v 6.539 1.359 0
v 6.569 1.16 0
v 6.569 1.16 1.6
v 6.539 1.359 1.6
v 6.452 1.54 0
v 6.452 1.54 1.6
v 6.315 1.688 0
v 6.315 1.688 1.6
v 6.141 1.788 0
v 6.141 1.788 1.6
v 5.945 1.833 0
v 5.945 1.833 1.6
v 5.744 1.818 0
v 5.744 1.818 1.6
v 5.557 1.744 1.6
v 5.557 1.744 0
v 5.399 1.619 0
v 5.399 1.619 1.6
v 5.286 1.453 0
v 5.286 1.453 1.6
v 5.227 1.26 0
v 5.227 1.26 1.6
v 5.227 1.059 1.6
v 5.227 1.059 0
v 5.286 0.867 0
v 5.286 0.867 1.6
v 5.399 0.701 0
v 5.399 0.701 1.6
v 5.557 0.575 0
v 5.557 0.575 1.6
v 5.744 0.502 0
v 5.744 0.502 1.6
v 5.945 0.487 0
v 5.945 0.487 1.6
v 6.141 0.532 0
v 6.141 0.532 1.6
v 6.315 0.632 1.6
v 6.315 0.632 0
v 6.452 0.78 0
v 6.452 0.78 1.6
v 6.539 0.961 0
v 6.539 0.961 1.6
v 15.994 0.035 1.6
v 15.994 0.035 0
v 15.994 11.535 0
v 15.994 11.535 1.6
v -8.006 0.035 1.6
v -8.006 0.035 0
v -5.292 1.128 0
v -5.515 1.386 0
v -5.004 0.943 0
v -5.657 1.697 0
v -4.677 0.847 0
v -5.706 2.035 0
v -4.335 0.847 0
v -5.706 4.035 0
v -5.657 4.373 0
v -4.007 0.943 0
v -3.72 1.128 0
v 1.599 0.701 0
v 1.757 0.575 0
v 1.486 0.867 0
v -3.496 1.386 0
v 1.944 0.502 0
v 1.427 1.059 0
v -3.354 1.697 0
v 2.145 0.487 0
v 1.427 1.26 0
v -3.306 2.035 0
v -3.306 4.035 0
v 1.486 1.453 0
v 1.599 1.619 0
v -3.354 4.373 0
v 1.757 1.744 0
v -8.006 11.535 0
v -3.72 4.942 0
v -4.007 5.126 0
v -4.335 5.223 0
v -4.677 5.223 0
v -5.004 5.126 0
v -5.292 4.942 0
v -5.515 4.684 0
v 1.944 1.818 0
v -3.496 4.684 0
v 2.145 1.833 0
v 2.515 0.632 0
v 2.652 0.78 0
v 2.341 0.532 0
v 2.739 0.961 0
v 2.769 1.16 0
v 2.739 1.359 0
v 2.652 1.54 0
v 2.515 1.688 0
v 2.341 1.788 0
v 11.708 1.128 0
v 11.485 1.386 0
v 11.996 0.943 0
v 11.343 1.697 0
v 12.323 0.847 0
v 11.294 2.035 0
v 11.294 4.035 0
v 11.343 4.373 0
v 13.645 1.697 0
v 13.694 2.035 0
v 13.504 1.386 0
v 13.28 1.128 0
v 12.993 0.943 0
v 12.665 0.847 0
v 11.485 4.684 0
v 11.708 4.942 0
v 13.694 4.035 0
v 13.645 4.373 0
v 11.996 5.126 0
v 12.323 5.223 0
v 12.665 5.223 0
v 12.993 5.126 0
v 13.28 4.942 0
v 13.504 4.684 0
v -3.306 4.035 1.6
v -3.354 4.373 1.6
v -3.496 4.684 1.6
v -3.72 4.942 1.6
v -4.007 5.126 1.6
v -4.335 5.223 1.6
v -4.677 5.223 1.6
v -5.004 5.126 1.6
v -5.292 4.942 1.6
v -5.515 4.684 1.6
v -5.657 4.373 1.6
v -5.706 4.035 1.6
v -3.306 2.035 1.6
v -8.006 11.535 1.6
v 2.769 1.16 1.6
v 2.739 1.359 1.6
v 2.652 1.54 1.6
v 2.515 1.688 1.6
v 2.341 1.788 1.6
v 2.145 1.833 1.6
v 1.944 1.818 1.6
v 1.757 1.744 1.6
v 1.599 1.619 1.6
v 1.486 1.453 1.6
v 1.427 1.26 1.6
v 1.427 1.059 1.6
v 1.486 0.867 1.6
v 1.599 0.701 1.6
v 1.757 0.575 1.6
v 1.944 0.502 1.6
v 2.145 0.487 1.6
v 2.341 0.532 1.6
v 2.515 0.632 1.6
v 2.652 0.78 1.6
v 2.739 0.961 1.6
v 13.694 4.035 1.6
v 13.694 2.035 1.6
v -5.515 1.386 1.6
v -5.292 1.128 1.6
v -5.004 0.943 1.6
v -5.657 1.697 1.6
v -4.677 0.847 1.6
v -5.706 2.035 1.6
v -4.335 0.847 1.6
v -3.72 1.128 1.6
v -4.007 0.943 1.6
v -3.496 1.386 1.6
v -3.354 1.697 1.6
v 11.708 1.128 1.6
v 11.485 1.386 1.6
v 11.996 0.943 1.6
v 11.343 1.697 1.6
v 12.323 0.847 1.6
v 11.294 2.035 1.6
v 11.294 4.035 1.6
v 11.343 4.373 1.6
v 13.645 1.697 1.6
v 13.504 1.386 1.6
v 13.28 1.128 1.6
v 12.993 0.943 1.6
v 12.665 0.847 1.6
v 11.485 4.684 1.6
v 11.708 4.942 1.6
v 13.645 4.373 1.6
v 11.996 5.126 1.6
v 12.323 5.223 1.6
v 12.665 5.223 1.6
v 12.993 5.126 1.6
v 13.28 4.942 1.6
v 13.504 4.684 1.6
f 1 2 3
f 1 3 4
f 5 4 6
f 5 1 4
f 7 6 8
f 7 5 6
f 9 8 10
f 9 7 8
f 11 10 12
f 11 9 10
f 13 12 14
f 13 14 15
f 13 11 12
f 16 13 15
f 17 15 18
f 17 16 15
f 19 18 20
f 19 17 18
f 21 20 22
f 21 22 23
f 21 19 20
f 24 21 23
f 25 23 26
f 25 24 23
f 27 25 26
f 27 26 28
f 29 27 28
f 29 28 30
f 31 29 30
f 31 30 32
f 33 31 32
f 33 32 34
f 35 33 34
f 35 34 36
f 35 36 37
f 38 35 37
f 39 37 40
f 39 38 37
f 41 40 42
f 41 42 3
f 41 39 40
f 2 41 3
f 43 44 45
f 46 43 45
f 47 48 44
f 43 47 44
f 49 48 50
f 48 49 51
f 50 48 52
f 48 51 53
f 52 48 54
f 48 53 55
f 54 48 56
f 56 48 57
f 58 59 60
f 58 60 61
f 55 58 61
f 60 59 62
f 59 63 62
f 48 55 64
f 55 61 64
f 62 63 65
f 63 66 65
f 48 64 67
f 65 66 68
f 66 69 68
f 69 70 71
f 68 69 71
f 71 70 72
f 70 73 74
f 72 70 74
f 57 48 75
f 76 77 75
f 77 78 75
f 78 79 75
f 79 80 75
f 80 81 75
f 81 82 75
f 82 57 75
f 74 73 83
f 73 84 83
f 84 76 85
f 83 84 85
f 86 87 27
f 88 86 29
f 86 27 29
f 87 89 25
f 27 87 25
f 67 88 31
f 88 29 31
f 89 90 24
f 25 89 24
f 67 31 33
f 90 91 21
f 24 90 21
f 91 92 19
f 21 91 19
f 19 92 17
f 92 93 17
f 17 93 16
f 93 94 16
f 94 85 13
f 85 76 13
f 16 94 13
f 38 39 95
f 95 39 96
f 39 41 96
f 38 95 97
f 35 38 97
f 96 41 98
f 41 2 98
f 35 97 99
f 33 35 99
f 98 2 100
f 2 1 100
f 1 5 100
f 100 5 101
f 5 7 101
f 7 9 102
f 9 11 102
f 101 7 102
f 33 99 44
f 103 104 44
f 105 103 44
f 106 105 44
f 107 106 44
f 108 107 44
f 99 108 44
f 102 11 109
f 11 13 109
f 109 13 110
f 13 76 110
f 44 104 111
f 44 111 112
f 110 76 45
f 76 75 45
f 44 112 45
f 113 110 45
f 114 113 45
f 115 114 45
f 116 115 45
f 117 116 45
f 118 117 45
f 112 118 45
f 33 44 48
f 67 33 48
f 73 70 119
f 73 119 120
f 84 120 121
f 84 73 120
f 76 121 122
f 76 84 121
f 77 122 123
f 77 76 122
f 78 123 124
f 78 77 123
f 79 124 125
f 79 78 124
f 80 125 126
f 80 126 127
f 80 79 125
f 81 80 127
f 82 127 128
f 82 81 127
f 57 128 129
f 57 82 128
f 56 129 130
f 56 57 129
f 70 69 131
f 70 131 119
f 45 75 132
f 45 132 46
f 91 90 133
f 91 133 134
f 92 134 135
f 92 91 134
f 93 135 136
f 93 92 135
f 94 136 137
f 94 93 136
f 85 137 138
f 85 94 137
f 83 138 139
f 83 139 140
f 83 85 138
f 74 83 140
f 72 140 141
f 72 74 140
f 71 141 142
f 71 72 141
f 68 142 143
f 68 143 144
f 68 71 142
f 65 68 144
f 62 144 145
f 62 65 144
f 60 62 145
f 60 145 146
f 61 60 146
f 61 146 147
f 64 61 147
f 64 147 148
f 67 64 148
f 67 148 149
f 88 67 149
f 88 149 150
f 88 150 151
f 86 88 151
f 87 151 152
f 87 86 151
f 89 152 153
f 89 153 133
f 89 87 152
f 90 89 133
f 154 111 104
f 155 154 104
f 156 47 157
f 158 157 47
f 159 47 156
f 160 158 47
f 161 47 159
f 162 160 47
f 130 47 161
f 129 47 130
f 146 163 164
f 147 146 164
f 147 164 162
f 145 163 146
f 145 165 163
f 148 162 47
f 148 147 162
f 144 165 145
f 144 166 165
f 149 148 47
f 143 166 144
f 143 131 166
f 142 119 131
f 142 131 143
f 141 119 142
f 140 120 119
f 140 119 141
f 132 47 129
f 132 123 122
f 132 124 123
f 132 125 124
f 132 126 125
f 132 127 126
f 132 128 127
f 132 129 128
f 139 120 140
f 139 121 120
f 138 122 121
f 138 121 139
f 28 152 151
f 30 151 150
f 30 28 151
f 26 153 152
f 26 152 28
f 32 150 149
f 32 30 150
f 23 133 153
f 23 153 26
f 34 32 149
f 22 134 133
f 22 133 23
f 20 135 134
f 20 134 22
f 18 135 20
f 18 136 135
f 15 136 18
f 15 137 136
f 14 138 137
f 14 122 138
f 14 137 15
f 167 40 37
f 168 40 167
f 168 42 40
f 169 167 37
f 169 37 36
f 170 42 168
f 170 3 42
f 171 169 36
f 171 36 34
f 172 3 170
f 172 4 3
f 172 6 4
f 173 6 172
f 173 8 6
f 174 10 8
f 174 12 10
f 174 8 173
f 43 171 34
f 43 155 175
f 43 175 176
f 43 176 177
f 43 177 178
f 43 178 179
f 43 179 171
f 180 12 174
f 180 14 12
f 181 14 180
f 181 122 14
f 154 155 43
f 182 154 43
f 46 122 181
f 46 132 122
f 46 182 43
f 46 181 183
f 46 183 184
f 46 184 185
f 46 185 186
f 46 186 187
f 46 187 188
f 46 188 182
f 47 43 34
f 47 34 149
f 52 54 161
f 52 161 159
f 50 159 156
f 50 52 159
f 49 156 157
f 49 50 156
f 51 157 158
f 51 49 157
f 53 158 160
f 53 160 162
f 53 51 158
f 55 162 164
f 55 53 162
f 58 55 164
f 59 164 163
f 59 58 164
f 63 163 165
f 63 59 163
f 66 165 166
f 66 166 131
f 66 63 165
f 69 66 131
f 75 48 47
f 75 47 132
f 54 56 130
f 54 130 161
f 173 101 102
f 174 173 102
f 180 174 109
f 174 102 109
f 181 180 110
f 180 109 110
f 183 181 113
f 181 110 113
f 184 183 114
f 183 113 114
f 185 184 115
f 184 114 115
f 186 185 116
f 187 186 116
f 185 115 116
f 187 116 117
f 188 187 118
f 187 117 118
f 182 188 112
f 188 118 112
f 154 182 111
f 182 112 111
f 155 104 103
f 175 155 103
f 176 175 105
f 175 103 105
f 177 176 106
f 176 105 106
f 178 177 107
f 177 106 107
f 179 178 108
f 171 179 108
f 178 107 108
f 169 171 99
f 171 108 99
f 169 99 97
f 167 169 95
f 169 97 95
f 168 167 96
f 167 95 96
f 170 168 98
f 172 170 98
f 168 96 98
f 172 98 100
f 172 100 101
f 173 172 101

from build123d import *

# Parameters (mm, degrees)
SKETCH2_W           = 23.999949
SKETCH2_H           = 11.5
SKETCH2_R           = 0.675
BOSS_EXTRUDE1_DEPTH = 1.6


with BuildPart() as part:
    # Sketch2 → Boss-Extrude1 (new body)
    with BuildSketch(Plane.XY):
        with Locations((3.994128142, 5.784892068)):
            Rectangle(SKETCH2_W, SKETCH2_H)
        with Locations((2.094154642, 1.159893068)):
            Circle(SKETCH2_R, mode=Mode.SUBTRACT)
        with Locations((5.894154642, 1.159893068)):
            Circle(SKETCH2_R, mode=Mode.SUBTRACT)
        with BuildLine():
            Line((11.294102642, 2.034892068), (11.294102642, 4.034892068))
            ThreePointArc((11.294102642, 4.034892068), (12.494102642, 5.234892068), (13.694102642, 4.034892068))
            Line((13.694102642, 4.034892068), (13.694102642, 2.034892068))
            ThreePointArc((13.694102642, 2.034892068), (12.494102642, 0.834892068), (11.294102642, 2.034892068))
        make_face(mode=Mode.SUBTRACT)
        with BuildLine():
            Line((-3.305846358, 2.034892068), (-3.305846358, 4.034892068))
            ThreePointArc((-3.305846358, 4.034892068), (-4.505846358, 5.234892068), (-5.705846358, 4.034892068))
            Line((-5.705846358, 4.034892068), (-5.705846358, 2.034892068))
            ThreePointArc((-5.705846358, 2.034892068), (-4.505846358, 0.834892068), (-3.305846358, 2.034892068))
        make_face(mode=Mode.SUBTRACT)
    extrude(amount=BOSS_EXTRUDE1_DEPTH)


solid = part.part
